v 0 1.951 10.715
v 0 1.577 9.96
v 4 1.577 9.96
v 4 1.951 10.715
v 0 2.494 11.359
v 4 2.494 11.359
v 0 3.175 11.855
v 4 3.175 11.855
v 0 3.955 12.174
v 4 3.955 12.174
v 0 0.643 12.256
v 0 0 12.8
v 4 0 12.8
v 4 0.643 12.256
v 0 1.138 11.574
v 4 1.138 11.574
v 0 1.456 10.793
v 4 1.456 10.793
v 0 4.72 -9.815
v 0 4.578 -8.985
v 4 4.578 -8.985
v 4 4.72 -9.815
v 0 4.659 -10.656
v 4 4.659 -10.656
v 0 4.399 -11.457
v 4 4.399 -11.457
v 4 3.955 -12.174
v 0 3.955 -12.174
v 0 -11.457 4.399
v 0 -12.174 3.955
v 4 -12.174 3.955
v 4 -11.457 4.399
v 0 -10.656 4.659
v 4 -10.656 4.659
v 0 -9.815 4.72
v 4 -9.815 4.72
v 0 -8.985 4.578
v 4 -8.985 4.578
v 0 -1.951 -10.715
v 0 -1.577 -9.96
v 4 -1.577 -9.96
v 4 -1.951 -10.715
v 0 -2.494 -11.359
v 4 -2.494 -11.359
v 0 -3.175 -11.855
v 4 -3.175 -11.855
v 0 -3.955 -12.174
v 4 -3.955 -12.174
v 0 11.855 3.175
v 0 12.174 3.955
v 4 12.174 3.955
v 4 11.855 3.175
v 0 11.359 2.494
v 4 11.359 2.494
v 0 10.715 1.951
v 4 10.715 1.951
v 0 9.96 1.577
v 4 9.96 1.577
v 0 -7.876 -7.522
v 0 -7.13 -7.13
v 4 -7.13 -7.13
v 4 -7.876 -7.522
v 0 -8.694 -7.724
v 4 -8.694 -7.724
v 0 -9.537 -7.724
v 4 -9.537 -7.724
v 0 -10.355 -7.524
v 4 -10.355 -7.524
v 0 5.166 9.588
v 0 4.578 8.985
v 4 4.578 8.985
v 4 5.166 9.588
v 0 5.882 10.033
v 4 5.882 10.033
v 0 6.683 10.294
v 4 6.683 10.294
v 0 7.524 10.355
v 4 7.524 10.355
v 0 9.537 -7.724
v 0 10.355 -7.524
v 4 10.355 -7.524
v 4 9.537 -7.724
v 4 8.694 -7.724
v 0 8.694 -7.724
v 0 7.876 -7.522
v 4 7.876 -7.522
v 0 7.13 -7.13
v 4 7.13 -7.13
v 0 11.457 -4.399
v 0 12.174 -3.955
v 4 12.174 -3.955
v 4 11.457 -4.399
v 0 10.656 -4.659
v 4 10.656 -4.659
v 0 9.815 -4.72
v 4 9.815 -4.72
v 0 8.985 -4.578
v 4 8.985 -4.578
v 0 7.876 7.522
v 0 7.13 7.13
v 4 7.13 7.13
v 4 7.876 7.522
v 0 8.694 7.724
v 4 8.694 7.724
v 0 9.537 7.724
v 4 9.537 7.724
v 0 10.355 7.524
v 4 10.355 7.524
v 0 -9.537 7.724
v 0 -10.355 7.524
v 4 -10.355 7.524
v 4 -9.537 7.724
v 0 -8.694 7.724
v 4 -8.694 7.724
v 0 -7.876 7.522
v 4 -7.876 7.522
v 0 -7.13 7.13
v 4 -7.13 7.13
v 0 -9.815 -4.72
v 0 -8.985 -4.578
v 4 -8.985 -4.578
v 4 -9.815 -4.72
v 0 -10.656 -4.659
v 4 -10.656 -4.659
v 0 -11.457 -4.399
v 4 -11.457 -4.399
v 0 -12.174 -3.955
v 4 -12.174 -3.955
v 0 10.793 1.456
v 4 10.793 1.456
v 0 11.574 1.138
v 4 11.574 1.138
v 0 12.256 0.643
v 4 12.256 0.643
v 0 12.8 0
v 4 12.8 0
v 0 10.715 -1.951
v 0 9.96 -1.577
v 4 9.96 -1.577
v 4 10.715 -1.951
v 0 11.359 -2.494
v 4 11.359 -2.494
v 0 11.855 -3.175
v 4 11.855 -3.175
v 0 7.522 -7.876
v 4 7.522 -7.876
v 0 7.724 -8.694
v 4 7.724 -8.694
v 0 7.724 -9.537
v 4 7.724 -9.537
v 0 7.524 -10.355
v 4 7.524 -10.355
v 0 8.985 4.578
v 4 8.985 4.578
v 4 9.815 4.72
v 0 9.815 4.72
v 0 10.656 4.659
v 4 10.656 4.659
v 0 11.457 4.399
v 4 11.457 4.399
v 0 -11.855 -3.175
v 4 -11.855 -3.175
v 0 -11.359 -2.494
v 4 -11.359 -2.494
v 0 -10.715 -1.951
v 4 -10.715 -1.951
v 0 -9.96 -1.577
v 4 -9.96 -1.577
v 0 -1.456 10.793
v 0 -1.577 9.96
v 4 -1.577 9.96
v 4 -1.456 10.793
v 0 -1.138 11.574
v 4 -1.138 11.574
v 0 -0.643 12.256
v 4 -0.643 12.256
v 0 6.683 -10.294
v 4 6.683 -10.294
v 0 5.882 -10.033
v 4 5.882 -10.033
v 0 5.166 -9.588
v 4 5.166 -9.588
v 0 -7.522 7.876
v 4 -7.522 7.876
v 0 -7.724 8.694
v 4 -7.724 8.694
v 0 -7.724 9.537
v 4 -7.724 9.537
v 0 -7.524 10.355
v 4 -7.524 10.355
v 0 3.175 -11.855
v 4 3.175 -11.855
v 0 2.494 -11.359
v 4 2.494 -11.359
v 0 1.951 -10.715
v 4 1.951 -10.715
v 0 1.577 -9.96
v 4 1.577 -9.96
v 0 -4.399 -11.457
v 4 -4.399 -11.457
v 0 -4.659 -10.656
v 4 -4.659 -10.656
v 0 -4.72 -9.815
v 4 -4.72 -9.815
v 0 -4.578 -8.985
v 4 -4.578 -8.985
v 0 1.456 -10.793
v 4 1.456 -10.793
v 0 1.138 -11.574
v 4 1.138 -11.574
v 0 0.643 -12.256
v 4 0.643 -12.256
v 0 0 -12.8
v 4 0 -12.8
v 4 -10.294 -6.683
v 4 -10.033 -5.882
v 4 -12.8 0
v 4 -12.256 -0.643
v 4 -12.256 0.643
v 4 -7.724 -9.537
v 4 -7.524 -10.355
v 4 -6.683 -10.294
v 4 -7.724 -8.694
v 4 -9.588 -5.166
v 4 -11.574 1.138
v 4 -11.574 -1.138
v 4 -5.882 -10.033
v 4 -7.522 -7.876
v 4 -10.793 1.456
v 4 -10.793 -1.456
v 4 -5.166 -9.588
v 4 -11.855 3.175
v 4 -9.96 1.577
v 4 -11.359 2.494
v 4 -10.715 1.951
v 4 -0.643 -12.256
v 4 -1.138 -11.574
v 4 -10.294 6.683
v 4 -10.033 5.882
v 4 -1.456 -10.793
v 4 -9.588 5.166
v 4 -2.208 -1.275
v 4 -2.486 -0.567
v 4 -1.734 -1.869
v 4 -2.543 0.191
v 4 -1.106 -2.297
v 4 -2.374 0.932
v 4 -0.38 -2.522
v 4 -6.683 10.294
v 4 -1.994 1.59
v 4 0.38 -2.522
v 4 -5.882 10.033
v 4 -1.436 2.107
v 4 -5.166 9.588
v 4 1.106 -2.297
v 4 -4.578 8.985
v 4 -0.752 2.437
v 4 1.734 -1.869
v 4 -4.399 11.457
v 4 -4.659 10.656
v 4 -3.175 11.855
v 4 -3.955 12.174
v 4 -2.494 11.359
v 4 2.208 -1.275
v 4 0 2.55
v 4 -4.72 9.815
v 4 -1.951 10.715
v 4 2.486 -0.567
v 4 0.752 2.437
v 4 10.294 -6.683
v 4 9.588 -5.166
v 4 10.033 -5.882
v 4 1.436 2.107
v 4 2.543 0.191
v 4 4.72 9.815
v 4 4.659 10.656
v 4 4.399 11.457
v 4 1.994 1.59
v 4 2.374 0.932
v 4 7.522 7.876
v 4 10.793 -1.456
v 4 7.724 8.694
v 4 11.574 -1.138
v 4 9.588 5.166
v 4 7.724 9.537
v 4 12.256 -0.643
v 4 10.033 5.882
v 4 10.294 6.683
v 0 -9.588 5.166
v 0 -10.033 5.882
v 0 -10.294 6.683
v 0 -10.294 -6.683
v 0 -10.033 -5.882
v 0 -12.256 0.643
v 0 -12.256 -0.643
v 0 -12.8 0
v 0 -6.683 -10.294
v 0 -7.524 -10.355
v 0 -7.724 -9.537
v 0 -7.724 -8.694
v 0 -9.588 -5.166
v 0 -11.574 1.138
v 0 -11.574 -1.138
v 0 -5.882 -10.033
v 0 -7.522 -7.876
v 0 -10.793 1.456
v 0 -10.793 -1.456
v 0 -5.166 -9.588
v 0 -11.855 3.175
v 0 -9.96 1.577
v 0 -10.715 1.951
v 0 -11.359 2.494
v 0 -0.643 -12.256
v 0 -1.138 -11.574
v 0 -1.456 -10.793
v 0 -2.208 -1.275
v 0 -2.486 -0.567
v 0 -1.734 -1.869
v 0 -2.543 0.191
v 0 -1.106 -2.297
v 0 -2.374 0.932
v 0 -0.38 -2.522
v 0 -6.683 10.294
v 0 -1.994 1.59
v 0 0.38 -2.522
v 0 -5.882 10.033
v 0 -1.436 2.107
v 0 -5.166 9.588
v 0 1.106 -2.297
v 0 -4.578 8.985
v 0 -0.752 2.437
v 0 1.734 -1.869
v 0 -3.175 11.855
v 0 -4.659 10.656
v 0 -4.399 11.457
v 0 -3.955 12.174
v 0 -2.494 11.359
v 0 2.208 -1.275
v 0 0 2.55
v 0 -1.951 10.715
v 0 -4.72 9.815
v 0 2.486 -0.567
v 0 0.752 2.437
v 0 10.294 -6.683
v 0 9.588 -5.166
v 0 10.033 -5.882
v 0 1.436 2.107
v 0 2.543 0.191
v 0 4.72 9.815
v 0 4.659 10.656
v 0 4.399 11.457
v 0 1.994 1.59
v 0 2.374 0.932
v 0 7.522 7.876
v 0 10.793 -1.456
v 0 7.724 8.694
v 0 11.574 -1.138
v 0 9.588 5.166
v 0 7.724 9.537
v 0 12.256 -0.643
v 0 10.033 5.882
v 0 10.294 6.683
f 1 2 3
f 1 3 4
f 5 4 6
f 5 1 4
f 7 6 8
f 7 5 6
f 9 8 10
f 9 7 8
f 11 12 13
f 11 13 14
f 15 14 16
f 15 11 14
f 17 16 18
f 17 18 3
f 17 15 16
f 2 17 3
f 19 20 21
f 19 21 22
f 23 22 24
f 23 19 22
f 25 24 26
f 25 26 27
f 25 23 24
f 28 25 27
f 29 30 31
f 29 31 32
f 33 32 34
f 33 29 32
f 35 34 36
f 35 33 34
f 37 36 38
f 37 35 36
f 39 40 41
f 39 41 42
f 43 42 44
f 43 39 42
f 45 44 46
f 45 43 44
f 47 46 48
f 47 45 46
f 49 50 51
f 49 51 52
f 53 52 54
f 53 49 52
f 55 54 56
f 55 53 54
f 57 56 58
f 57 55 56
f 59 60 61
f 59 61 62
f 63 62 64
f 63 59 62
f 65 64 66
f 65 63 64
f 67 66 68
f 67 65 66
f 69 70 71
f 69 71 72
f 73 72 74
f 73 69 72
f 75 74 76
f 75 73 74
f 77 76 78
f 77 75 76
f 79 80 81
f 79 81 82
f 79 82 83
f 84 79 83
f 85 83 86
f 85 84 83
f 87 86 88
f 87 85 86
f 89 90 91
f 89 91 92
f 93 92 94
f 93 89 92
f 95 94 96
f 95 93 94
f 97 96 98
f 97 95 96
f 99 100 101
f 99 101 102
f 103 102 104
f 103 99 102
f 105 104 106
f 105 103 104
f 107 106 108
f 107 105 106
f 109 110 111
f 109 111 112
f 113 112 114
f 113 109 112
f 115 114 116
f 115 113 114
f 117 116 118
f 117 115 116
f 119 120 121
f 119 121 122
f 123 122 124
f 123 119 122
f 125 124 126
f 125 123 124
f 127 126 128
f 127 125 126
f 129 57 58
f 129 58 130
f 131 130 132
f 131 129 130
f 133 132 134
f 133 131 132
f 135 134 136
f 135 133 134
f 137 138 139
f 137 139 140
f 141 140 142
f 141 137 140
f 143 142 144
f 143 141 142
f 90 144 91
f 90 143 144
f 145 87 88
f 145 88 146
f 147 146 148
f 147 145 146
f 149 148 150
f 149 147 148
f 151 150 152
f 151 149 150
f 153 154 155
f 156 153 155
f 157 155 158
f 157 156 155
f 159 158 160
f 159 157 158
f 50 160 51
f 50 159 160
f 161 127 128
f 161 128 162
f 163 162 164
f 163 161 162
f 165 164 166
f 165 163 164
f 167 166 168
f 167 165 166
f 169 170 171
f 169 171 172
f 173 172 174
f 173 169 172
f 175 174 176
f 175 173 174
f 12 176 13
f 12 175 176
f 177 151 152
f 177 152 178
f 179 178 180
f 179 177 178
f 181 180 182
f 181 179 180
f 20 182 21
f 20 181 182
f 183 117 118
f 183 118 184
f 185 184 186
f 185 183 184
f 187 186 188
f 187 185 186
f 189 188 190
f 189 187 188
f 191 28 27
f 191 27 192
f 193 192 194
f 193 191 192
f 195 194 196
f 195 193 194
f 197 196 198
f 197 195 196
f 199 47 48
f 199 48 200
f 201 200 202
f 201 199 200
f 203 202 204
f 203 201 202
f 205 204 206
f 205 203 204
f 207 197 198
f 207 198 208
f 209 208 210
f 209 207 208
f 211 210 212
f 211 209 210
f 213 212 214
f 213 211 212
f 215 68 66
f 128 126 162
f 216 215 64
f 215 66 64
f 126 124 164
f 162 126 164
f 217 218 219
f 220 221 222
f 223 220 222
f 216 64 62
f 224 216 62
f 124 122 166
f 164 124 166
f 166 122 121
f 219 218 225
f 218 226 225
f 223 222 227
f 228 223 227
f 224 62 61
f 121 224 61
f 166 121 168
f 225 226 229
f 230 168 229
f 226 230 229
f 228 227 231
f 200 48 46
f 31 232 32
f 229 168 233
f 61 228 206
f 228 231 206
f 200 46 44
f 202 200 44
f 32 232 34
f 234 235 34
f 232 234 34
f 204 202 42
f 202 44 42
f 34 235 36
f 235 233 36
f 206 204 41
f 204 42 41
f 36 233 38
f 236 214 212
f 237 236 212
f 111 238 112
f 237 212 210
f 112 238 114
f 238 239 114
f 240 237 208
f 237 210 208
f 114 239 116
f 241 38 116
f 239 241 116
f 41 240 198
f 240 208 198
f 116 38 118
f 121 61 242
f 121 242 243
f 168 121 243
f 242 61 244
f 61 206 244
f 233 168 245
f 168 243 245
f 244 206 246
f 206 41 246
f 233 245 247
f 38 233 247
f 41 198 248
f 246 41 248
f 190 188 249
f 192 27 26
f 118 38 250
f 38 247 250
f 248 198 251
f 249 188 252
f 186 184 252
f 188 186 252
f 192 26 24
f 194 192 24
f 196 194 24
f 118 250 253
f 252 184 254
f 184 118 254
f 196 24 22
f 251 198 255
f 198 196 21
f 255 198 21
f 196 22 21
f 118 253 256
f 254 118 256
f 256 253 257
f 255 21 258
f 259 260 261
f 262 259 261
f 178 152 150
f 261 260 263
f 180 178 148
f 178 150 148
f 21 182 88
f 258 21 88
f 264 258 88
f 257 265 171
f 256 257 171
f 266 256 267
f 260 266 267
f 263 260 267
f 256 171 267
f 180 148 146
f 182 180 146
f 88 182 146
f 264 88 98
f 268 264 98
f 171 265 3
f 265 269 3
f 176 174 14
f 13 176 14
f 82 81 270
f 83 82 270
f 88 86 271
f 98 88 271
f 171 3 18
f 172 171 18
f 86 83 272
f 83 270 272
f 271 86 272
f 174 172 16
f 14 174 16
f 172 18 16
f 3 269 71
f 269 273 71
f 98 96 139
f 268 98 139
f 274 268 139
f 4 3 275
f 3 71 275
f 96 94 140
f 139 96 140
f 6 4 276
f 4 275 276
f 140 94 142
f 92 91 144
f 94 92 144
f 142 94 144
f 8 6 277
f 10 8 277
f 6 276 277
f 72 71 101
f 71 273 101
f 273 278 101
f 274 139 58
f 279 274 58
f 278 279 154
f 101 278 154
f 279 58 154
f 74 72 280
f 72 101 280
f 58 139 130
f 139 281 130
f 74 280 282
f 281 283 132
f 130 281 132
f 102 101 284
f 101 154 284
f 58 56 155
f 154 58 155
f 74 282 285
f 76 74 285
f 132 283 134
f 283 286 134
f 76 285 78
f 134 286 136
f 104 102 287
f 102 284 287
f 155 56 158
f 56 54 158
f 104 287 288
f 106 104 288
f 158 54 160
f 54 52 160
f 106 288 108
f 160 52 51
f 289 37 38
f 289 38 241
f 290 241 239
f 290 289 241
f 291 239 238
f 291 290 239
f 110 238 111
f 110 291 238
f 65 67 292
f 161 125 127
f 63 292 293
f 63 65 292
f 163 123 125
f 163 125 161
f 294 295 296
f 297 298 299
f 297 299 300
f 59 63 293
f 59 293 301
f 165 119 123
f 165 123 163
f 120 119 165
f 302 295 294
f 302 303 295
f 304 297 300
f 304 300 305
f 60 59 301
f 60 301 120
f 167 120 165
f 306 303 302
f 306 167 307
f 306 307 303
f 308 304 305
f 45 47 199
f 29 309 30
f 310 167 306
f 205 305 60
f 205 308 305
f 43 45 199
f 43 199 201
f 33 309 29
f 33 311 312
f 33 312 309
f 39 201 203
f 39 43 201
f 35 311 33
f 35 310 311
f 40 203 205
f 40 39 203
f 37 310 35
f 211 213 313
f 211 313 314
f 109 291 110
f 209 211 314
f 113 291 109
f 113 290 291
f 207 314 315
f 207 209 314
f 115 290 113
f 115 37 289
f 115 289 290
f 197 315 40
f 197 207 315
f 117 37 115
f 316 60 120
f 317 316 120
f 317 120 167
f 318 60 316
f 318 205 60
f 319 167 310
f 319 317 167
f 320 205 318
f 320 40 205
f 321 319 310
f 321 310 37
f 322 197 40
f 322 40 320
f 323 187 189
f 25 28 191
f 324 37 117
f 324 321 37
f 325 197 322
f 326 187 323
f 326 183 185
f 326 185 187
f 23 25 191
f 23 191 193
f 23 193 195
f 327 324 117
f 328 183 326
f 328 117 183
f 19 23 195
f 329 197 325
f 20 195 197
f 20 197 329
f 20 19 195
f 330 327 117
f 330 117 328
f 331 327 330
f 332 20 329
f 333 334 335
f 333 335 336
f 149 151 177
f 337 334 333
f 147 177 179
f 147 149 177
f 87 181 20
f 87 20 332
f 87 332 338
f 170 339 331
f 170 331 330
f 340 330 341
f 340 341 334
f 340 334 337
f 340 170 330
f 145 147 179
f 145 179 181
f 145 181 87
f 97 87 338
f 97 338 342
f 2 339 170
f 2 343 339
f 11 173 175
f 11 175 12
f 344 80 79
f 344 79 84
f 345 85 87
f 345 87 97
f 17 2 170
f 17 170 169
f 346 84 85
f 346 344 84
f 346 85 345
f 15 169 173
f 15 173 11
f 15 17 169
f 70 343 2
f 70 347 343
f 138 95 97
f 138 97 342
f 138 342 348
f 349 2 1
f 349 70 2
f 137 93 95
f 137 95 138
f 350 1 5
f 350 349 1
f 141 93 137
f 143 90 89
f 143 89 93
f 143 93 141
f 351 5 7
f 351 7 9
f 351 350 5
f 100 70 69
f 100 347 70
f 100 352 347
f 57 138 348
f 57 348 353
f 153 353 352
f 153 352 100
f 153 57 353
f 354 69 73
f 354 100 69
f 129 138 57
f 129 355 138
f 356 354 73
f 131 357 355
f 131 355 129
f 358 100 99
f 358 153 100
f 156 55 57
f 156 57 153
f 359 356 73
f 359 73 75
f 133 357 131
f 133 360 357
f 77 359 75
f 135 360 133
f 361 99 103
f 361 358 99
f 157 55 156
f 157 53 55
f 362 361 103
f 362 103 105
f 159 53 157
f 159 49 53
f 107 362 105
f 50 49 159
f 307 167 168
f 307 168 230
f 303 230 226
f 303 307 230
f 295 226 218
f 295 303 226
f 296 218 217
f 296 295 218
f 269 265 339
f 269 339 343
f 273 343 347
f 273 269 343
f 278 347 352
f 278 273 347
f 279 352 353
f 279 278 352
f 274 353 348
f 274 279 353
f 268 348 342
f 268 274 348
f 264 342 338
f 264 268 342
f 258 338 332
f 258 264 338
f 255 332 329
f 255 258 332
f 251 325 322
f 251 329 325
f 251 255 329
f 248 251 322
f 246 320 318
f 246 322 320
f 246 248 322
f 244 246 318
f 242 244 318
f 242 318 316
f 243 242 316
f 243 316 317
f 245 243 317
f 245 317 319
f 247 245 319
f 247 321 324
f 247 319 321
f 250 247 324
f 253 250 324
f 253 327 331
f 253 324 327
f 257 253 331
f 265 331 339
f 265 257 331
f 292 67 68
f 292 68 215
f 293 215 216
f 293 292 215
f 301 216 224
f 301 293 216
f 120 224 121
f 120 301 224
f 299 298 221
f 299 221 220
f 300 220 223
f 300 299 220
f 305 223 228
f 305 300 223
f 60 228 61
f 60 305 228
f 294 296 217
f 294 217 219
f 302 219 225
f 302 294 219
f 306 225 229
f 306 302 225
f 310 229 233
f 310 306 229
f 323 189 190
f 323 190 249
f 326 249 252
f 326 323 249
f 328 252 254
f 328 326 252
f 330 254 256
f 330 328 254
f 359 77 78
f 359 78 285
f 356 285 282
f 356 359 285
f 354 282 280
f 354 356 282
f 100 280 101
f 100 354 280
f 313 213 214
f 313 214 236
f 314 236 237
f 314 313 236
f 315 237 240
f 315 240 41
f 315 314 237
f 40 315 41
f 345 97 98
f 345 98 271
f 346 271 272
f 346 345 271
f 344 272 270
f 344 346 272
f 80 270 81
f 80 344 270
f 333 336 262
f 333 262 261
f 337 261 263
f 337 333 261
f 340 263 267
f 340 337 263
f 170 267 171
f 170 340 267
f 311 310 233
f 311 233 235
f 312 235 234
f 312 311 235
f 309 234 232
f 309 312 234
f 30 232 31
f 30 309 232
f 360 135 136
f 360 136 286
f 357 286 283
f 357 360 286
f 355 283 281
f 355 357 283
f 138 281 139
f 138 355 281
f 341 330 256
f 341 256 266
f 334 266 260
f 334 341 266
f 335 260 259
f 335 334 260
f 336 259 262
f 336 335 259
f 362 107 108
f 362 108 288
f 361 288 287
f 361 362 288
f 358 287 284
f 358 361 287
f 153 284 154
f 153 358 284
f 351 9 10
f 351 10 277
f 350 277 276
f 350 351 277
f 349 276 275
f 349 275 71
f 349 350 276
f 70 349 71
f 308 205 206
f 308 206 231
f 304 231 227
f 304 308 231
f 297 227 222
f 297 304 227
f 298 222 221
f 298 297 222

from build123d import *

# Parameters (mm, degrees)
EXTRUDE_1_DEPTH          = 4
PATTERN_CIRCULAR_1_COUNT = 20
CUT_EXTRUDE_1_DEPTH      = 19.538608362
CUT_EXTRUDE_1_DEPTH_BACK = 19.538608362
SKETCH_2_R               = 2.55


with BuildPart() as part:
    # 스케치1 → 보스-돌출1 (new body)
    with BuildSketch(Plane(origin=(0, 0, 0), x_dir=(0, 0, -1), z_dir=(1, 0, 0))):
        with BuildLine():
            ThreePointArc((0, 12.8), (1.158685544, 11.536663611), (1.578481404, 9.874633991))
            ThreePointArc((1.578481404, 9.874633991), (0, -10), (-1.578481404, 9.874633991))
            ThreePointArc((-1.578481404, 9.874633991), (-1.158685544, 11.536663611), (0, 12.8))
        make_face()
    extrude_1 = extrude(amount=EXTRUDE_1_DEPTH)

    # 원형 패턴1: 보스-돌출1 ×20 about axis
    pattern_circular_1_axis = Axis((0, 0, 0), (1, 0, 0))
    for i in range(1, PATTERN_CIRCULAR_1_COUNT):
        add(extrude_1.rotate(pattern_circular_1_axis, i * 360 / PATTERN_CIRCULAR_1_COUNT))

    # 스케치2 → 컷-돌출1 (cut, two sides: drawn at the far end of the back side and taken through both)
    with BuildSketch(Plane.ZY.offset(-CUT_EXTRUDE_1_DEPTH_BACK)):
        Circle(SKETCH_2_R)
    extrude(amount=CUT_EXTRUDE_1_DEPTH + CUT_EXTRUDE_1_DEPTH_BACK, mode=Mode.SUBTRACT)


solid = part.part
